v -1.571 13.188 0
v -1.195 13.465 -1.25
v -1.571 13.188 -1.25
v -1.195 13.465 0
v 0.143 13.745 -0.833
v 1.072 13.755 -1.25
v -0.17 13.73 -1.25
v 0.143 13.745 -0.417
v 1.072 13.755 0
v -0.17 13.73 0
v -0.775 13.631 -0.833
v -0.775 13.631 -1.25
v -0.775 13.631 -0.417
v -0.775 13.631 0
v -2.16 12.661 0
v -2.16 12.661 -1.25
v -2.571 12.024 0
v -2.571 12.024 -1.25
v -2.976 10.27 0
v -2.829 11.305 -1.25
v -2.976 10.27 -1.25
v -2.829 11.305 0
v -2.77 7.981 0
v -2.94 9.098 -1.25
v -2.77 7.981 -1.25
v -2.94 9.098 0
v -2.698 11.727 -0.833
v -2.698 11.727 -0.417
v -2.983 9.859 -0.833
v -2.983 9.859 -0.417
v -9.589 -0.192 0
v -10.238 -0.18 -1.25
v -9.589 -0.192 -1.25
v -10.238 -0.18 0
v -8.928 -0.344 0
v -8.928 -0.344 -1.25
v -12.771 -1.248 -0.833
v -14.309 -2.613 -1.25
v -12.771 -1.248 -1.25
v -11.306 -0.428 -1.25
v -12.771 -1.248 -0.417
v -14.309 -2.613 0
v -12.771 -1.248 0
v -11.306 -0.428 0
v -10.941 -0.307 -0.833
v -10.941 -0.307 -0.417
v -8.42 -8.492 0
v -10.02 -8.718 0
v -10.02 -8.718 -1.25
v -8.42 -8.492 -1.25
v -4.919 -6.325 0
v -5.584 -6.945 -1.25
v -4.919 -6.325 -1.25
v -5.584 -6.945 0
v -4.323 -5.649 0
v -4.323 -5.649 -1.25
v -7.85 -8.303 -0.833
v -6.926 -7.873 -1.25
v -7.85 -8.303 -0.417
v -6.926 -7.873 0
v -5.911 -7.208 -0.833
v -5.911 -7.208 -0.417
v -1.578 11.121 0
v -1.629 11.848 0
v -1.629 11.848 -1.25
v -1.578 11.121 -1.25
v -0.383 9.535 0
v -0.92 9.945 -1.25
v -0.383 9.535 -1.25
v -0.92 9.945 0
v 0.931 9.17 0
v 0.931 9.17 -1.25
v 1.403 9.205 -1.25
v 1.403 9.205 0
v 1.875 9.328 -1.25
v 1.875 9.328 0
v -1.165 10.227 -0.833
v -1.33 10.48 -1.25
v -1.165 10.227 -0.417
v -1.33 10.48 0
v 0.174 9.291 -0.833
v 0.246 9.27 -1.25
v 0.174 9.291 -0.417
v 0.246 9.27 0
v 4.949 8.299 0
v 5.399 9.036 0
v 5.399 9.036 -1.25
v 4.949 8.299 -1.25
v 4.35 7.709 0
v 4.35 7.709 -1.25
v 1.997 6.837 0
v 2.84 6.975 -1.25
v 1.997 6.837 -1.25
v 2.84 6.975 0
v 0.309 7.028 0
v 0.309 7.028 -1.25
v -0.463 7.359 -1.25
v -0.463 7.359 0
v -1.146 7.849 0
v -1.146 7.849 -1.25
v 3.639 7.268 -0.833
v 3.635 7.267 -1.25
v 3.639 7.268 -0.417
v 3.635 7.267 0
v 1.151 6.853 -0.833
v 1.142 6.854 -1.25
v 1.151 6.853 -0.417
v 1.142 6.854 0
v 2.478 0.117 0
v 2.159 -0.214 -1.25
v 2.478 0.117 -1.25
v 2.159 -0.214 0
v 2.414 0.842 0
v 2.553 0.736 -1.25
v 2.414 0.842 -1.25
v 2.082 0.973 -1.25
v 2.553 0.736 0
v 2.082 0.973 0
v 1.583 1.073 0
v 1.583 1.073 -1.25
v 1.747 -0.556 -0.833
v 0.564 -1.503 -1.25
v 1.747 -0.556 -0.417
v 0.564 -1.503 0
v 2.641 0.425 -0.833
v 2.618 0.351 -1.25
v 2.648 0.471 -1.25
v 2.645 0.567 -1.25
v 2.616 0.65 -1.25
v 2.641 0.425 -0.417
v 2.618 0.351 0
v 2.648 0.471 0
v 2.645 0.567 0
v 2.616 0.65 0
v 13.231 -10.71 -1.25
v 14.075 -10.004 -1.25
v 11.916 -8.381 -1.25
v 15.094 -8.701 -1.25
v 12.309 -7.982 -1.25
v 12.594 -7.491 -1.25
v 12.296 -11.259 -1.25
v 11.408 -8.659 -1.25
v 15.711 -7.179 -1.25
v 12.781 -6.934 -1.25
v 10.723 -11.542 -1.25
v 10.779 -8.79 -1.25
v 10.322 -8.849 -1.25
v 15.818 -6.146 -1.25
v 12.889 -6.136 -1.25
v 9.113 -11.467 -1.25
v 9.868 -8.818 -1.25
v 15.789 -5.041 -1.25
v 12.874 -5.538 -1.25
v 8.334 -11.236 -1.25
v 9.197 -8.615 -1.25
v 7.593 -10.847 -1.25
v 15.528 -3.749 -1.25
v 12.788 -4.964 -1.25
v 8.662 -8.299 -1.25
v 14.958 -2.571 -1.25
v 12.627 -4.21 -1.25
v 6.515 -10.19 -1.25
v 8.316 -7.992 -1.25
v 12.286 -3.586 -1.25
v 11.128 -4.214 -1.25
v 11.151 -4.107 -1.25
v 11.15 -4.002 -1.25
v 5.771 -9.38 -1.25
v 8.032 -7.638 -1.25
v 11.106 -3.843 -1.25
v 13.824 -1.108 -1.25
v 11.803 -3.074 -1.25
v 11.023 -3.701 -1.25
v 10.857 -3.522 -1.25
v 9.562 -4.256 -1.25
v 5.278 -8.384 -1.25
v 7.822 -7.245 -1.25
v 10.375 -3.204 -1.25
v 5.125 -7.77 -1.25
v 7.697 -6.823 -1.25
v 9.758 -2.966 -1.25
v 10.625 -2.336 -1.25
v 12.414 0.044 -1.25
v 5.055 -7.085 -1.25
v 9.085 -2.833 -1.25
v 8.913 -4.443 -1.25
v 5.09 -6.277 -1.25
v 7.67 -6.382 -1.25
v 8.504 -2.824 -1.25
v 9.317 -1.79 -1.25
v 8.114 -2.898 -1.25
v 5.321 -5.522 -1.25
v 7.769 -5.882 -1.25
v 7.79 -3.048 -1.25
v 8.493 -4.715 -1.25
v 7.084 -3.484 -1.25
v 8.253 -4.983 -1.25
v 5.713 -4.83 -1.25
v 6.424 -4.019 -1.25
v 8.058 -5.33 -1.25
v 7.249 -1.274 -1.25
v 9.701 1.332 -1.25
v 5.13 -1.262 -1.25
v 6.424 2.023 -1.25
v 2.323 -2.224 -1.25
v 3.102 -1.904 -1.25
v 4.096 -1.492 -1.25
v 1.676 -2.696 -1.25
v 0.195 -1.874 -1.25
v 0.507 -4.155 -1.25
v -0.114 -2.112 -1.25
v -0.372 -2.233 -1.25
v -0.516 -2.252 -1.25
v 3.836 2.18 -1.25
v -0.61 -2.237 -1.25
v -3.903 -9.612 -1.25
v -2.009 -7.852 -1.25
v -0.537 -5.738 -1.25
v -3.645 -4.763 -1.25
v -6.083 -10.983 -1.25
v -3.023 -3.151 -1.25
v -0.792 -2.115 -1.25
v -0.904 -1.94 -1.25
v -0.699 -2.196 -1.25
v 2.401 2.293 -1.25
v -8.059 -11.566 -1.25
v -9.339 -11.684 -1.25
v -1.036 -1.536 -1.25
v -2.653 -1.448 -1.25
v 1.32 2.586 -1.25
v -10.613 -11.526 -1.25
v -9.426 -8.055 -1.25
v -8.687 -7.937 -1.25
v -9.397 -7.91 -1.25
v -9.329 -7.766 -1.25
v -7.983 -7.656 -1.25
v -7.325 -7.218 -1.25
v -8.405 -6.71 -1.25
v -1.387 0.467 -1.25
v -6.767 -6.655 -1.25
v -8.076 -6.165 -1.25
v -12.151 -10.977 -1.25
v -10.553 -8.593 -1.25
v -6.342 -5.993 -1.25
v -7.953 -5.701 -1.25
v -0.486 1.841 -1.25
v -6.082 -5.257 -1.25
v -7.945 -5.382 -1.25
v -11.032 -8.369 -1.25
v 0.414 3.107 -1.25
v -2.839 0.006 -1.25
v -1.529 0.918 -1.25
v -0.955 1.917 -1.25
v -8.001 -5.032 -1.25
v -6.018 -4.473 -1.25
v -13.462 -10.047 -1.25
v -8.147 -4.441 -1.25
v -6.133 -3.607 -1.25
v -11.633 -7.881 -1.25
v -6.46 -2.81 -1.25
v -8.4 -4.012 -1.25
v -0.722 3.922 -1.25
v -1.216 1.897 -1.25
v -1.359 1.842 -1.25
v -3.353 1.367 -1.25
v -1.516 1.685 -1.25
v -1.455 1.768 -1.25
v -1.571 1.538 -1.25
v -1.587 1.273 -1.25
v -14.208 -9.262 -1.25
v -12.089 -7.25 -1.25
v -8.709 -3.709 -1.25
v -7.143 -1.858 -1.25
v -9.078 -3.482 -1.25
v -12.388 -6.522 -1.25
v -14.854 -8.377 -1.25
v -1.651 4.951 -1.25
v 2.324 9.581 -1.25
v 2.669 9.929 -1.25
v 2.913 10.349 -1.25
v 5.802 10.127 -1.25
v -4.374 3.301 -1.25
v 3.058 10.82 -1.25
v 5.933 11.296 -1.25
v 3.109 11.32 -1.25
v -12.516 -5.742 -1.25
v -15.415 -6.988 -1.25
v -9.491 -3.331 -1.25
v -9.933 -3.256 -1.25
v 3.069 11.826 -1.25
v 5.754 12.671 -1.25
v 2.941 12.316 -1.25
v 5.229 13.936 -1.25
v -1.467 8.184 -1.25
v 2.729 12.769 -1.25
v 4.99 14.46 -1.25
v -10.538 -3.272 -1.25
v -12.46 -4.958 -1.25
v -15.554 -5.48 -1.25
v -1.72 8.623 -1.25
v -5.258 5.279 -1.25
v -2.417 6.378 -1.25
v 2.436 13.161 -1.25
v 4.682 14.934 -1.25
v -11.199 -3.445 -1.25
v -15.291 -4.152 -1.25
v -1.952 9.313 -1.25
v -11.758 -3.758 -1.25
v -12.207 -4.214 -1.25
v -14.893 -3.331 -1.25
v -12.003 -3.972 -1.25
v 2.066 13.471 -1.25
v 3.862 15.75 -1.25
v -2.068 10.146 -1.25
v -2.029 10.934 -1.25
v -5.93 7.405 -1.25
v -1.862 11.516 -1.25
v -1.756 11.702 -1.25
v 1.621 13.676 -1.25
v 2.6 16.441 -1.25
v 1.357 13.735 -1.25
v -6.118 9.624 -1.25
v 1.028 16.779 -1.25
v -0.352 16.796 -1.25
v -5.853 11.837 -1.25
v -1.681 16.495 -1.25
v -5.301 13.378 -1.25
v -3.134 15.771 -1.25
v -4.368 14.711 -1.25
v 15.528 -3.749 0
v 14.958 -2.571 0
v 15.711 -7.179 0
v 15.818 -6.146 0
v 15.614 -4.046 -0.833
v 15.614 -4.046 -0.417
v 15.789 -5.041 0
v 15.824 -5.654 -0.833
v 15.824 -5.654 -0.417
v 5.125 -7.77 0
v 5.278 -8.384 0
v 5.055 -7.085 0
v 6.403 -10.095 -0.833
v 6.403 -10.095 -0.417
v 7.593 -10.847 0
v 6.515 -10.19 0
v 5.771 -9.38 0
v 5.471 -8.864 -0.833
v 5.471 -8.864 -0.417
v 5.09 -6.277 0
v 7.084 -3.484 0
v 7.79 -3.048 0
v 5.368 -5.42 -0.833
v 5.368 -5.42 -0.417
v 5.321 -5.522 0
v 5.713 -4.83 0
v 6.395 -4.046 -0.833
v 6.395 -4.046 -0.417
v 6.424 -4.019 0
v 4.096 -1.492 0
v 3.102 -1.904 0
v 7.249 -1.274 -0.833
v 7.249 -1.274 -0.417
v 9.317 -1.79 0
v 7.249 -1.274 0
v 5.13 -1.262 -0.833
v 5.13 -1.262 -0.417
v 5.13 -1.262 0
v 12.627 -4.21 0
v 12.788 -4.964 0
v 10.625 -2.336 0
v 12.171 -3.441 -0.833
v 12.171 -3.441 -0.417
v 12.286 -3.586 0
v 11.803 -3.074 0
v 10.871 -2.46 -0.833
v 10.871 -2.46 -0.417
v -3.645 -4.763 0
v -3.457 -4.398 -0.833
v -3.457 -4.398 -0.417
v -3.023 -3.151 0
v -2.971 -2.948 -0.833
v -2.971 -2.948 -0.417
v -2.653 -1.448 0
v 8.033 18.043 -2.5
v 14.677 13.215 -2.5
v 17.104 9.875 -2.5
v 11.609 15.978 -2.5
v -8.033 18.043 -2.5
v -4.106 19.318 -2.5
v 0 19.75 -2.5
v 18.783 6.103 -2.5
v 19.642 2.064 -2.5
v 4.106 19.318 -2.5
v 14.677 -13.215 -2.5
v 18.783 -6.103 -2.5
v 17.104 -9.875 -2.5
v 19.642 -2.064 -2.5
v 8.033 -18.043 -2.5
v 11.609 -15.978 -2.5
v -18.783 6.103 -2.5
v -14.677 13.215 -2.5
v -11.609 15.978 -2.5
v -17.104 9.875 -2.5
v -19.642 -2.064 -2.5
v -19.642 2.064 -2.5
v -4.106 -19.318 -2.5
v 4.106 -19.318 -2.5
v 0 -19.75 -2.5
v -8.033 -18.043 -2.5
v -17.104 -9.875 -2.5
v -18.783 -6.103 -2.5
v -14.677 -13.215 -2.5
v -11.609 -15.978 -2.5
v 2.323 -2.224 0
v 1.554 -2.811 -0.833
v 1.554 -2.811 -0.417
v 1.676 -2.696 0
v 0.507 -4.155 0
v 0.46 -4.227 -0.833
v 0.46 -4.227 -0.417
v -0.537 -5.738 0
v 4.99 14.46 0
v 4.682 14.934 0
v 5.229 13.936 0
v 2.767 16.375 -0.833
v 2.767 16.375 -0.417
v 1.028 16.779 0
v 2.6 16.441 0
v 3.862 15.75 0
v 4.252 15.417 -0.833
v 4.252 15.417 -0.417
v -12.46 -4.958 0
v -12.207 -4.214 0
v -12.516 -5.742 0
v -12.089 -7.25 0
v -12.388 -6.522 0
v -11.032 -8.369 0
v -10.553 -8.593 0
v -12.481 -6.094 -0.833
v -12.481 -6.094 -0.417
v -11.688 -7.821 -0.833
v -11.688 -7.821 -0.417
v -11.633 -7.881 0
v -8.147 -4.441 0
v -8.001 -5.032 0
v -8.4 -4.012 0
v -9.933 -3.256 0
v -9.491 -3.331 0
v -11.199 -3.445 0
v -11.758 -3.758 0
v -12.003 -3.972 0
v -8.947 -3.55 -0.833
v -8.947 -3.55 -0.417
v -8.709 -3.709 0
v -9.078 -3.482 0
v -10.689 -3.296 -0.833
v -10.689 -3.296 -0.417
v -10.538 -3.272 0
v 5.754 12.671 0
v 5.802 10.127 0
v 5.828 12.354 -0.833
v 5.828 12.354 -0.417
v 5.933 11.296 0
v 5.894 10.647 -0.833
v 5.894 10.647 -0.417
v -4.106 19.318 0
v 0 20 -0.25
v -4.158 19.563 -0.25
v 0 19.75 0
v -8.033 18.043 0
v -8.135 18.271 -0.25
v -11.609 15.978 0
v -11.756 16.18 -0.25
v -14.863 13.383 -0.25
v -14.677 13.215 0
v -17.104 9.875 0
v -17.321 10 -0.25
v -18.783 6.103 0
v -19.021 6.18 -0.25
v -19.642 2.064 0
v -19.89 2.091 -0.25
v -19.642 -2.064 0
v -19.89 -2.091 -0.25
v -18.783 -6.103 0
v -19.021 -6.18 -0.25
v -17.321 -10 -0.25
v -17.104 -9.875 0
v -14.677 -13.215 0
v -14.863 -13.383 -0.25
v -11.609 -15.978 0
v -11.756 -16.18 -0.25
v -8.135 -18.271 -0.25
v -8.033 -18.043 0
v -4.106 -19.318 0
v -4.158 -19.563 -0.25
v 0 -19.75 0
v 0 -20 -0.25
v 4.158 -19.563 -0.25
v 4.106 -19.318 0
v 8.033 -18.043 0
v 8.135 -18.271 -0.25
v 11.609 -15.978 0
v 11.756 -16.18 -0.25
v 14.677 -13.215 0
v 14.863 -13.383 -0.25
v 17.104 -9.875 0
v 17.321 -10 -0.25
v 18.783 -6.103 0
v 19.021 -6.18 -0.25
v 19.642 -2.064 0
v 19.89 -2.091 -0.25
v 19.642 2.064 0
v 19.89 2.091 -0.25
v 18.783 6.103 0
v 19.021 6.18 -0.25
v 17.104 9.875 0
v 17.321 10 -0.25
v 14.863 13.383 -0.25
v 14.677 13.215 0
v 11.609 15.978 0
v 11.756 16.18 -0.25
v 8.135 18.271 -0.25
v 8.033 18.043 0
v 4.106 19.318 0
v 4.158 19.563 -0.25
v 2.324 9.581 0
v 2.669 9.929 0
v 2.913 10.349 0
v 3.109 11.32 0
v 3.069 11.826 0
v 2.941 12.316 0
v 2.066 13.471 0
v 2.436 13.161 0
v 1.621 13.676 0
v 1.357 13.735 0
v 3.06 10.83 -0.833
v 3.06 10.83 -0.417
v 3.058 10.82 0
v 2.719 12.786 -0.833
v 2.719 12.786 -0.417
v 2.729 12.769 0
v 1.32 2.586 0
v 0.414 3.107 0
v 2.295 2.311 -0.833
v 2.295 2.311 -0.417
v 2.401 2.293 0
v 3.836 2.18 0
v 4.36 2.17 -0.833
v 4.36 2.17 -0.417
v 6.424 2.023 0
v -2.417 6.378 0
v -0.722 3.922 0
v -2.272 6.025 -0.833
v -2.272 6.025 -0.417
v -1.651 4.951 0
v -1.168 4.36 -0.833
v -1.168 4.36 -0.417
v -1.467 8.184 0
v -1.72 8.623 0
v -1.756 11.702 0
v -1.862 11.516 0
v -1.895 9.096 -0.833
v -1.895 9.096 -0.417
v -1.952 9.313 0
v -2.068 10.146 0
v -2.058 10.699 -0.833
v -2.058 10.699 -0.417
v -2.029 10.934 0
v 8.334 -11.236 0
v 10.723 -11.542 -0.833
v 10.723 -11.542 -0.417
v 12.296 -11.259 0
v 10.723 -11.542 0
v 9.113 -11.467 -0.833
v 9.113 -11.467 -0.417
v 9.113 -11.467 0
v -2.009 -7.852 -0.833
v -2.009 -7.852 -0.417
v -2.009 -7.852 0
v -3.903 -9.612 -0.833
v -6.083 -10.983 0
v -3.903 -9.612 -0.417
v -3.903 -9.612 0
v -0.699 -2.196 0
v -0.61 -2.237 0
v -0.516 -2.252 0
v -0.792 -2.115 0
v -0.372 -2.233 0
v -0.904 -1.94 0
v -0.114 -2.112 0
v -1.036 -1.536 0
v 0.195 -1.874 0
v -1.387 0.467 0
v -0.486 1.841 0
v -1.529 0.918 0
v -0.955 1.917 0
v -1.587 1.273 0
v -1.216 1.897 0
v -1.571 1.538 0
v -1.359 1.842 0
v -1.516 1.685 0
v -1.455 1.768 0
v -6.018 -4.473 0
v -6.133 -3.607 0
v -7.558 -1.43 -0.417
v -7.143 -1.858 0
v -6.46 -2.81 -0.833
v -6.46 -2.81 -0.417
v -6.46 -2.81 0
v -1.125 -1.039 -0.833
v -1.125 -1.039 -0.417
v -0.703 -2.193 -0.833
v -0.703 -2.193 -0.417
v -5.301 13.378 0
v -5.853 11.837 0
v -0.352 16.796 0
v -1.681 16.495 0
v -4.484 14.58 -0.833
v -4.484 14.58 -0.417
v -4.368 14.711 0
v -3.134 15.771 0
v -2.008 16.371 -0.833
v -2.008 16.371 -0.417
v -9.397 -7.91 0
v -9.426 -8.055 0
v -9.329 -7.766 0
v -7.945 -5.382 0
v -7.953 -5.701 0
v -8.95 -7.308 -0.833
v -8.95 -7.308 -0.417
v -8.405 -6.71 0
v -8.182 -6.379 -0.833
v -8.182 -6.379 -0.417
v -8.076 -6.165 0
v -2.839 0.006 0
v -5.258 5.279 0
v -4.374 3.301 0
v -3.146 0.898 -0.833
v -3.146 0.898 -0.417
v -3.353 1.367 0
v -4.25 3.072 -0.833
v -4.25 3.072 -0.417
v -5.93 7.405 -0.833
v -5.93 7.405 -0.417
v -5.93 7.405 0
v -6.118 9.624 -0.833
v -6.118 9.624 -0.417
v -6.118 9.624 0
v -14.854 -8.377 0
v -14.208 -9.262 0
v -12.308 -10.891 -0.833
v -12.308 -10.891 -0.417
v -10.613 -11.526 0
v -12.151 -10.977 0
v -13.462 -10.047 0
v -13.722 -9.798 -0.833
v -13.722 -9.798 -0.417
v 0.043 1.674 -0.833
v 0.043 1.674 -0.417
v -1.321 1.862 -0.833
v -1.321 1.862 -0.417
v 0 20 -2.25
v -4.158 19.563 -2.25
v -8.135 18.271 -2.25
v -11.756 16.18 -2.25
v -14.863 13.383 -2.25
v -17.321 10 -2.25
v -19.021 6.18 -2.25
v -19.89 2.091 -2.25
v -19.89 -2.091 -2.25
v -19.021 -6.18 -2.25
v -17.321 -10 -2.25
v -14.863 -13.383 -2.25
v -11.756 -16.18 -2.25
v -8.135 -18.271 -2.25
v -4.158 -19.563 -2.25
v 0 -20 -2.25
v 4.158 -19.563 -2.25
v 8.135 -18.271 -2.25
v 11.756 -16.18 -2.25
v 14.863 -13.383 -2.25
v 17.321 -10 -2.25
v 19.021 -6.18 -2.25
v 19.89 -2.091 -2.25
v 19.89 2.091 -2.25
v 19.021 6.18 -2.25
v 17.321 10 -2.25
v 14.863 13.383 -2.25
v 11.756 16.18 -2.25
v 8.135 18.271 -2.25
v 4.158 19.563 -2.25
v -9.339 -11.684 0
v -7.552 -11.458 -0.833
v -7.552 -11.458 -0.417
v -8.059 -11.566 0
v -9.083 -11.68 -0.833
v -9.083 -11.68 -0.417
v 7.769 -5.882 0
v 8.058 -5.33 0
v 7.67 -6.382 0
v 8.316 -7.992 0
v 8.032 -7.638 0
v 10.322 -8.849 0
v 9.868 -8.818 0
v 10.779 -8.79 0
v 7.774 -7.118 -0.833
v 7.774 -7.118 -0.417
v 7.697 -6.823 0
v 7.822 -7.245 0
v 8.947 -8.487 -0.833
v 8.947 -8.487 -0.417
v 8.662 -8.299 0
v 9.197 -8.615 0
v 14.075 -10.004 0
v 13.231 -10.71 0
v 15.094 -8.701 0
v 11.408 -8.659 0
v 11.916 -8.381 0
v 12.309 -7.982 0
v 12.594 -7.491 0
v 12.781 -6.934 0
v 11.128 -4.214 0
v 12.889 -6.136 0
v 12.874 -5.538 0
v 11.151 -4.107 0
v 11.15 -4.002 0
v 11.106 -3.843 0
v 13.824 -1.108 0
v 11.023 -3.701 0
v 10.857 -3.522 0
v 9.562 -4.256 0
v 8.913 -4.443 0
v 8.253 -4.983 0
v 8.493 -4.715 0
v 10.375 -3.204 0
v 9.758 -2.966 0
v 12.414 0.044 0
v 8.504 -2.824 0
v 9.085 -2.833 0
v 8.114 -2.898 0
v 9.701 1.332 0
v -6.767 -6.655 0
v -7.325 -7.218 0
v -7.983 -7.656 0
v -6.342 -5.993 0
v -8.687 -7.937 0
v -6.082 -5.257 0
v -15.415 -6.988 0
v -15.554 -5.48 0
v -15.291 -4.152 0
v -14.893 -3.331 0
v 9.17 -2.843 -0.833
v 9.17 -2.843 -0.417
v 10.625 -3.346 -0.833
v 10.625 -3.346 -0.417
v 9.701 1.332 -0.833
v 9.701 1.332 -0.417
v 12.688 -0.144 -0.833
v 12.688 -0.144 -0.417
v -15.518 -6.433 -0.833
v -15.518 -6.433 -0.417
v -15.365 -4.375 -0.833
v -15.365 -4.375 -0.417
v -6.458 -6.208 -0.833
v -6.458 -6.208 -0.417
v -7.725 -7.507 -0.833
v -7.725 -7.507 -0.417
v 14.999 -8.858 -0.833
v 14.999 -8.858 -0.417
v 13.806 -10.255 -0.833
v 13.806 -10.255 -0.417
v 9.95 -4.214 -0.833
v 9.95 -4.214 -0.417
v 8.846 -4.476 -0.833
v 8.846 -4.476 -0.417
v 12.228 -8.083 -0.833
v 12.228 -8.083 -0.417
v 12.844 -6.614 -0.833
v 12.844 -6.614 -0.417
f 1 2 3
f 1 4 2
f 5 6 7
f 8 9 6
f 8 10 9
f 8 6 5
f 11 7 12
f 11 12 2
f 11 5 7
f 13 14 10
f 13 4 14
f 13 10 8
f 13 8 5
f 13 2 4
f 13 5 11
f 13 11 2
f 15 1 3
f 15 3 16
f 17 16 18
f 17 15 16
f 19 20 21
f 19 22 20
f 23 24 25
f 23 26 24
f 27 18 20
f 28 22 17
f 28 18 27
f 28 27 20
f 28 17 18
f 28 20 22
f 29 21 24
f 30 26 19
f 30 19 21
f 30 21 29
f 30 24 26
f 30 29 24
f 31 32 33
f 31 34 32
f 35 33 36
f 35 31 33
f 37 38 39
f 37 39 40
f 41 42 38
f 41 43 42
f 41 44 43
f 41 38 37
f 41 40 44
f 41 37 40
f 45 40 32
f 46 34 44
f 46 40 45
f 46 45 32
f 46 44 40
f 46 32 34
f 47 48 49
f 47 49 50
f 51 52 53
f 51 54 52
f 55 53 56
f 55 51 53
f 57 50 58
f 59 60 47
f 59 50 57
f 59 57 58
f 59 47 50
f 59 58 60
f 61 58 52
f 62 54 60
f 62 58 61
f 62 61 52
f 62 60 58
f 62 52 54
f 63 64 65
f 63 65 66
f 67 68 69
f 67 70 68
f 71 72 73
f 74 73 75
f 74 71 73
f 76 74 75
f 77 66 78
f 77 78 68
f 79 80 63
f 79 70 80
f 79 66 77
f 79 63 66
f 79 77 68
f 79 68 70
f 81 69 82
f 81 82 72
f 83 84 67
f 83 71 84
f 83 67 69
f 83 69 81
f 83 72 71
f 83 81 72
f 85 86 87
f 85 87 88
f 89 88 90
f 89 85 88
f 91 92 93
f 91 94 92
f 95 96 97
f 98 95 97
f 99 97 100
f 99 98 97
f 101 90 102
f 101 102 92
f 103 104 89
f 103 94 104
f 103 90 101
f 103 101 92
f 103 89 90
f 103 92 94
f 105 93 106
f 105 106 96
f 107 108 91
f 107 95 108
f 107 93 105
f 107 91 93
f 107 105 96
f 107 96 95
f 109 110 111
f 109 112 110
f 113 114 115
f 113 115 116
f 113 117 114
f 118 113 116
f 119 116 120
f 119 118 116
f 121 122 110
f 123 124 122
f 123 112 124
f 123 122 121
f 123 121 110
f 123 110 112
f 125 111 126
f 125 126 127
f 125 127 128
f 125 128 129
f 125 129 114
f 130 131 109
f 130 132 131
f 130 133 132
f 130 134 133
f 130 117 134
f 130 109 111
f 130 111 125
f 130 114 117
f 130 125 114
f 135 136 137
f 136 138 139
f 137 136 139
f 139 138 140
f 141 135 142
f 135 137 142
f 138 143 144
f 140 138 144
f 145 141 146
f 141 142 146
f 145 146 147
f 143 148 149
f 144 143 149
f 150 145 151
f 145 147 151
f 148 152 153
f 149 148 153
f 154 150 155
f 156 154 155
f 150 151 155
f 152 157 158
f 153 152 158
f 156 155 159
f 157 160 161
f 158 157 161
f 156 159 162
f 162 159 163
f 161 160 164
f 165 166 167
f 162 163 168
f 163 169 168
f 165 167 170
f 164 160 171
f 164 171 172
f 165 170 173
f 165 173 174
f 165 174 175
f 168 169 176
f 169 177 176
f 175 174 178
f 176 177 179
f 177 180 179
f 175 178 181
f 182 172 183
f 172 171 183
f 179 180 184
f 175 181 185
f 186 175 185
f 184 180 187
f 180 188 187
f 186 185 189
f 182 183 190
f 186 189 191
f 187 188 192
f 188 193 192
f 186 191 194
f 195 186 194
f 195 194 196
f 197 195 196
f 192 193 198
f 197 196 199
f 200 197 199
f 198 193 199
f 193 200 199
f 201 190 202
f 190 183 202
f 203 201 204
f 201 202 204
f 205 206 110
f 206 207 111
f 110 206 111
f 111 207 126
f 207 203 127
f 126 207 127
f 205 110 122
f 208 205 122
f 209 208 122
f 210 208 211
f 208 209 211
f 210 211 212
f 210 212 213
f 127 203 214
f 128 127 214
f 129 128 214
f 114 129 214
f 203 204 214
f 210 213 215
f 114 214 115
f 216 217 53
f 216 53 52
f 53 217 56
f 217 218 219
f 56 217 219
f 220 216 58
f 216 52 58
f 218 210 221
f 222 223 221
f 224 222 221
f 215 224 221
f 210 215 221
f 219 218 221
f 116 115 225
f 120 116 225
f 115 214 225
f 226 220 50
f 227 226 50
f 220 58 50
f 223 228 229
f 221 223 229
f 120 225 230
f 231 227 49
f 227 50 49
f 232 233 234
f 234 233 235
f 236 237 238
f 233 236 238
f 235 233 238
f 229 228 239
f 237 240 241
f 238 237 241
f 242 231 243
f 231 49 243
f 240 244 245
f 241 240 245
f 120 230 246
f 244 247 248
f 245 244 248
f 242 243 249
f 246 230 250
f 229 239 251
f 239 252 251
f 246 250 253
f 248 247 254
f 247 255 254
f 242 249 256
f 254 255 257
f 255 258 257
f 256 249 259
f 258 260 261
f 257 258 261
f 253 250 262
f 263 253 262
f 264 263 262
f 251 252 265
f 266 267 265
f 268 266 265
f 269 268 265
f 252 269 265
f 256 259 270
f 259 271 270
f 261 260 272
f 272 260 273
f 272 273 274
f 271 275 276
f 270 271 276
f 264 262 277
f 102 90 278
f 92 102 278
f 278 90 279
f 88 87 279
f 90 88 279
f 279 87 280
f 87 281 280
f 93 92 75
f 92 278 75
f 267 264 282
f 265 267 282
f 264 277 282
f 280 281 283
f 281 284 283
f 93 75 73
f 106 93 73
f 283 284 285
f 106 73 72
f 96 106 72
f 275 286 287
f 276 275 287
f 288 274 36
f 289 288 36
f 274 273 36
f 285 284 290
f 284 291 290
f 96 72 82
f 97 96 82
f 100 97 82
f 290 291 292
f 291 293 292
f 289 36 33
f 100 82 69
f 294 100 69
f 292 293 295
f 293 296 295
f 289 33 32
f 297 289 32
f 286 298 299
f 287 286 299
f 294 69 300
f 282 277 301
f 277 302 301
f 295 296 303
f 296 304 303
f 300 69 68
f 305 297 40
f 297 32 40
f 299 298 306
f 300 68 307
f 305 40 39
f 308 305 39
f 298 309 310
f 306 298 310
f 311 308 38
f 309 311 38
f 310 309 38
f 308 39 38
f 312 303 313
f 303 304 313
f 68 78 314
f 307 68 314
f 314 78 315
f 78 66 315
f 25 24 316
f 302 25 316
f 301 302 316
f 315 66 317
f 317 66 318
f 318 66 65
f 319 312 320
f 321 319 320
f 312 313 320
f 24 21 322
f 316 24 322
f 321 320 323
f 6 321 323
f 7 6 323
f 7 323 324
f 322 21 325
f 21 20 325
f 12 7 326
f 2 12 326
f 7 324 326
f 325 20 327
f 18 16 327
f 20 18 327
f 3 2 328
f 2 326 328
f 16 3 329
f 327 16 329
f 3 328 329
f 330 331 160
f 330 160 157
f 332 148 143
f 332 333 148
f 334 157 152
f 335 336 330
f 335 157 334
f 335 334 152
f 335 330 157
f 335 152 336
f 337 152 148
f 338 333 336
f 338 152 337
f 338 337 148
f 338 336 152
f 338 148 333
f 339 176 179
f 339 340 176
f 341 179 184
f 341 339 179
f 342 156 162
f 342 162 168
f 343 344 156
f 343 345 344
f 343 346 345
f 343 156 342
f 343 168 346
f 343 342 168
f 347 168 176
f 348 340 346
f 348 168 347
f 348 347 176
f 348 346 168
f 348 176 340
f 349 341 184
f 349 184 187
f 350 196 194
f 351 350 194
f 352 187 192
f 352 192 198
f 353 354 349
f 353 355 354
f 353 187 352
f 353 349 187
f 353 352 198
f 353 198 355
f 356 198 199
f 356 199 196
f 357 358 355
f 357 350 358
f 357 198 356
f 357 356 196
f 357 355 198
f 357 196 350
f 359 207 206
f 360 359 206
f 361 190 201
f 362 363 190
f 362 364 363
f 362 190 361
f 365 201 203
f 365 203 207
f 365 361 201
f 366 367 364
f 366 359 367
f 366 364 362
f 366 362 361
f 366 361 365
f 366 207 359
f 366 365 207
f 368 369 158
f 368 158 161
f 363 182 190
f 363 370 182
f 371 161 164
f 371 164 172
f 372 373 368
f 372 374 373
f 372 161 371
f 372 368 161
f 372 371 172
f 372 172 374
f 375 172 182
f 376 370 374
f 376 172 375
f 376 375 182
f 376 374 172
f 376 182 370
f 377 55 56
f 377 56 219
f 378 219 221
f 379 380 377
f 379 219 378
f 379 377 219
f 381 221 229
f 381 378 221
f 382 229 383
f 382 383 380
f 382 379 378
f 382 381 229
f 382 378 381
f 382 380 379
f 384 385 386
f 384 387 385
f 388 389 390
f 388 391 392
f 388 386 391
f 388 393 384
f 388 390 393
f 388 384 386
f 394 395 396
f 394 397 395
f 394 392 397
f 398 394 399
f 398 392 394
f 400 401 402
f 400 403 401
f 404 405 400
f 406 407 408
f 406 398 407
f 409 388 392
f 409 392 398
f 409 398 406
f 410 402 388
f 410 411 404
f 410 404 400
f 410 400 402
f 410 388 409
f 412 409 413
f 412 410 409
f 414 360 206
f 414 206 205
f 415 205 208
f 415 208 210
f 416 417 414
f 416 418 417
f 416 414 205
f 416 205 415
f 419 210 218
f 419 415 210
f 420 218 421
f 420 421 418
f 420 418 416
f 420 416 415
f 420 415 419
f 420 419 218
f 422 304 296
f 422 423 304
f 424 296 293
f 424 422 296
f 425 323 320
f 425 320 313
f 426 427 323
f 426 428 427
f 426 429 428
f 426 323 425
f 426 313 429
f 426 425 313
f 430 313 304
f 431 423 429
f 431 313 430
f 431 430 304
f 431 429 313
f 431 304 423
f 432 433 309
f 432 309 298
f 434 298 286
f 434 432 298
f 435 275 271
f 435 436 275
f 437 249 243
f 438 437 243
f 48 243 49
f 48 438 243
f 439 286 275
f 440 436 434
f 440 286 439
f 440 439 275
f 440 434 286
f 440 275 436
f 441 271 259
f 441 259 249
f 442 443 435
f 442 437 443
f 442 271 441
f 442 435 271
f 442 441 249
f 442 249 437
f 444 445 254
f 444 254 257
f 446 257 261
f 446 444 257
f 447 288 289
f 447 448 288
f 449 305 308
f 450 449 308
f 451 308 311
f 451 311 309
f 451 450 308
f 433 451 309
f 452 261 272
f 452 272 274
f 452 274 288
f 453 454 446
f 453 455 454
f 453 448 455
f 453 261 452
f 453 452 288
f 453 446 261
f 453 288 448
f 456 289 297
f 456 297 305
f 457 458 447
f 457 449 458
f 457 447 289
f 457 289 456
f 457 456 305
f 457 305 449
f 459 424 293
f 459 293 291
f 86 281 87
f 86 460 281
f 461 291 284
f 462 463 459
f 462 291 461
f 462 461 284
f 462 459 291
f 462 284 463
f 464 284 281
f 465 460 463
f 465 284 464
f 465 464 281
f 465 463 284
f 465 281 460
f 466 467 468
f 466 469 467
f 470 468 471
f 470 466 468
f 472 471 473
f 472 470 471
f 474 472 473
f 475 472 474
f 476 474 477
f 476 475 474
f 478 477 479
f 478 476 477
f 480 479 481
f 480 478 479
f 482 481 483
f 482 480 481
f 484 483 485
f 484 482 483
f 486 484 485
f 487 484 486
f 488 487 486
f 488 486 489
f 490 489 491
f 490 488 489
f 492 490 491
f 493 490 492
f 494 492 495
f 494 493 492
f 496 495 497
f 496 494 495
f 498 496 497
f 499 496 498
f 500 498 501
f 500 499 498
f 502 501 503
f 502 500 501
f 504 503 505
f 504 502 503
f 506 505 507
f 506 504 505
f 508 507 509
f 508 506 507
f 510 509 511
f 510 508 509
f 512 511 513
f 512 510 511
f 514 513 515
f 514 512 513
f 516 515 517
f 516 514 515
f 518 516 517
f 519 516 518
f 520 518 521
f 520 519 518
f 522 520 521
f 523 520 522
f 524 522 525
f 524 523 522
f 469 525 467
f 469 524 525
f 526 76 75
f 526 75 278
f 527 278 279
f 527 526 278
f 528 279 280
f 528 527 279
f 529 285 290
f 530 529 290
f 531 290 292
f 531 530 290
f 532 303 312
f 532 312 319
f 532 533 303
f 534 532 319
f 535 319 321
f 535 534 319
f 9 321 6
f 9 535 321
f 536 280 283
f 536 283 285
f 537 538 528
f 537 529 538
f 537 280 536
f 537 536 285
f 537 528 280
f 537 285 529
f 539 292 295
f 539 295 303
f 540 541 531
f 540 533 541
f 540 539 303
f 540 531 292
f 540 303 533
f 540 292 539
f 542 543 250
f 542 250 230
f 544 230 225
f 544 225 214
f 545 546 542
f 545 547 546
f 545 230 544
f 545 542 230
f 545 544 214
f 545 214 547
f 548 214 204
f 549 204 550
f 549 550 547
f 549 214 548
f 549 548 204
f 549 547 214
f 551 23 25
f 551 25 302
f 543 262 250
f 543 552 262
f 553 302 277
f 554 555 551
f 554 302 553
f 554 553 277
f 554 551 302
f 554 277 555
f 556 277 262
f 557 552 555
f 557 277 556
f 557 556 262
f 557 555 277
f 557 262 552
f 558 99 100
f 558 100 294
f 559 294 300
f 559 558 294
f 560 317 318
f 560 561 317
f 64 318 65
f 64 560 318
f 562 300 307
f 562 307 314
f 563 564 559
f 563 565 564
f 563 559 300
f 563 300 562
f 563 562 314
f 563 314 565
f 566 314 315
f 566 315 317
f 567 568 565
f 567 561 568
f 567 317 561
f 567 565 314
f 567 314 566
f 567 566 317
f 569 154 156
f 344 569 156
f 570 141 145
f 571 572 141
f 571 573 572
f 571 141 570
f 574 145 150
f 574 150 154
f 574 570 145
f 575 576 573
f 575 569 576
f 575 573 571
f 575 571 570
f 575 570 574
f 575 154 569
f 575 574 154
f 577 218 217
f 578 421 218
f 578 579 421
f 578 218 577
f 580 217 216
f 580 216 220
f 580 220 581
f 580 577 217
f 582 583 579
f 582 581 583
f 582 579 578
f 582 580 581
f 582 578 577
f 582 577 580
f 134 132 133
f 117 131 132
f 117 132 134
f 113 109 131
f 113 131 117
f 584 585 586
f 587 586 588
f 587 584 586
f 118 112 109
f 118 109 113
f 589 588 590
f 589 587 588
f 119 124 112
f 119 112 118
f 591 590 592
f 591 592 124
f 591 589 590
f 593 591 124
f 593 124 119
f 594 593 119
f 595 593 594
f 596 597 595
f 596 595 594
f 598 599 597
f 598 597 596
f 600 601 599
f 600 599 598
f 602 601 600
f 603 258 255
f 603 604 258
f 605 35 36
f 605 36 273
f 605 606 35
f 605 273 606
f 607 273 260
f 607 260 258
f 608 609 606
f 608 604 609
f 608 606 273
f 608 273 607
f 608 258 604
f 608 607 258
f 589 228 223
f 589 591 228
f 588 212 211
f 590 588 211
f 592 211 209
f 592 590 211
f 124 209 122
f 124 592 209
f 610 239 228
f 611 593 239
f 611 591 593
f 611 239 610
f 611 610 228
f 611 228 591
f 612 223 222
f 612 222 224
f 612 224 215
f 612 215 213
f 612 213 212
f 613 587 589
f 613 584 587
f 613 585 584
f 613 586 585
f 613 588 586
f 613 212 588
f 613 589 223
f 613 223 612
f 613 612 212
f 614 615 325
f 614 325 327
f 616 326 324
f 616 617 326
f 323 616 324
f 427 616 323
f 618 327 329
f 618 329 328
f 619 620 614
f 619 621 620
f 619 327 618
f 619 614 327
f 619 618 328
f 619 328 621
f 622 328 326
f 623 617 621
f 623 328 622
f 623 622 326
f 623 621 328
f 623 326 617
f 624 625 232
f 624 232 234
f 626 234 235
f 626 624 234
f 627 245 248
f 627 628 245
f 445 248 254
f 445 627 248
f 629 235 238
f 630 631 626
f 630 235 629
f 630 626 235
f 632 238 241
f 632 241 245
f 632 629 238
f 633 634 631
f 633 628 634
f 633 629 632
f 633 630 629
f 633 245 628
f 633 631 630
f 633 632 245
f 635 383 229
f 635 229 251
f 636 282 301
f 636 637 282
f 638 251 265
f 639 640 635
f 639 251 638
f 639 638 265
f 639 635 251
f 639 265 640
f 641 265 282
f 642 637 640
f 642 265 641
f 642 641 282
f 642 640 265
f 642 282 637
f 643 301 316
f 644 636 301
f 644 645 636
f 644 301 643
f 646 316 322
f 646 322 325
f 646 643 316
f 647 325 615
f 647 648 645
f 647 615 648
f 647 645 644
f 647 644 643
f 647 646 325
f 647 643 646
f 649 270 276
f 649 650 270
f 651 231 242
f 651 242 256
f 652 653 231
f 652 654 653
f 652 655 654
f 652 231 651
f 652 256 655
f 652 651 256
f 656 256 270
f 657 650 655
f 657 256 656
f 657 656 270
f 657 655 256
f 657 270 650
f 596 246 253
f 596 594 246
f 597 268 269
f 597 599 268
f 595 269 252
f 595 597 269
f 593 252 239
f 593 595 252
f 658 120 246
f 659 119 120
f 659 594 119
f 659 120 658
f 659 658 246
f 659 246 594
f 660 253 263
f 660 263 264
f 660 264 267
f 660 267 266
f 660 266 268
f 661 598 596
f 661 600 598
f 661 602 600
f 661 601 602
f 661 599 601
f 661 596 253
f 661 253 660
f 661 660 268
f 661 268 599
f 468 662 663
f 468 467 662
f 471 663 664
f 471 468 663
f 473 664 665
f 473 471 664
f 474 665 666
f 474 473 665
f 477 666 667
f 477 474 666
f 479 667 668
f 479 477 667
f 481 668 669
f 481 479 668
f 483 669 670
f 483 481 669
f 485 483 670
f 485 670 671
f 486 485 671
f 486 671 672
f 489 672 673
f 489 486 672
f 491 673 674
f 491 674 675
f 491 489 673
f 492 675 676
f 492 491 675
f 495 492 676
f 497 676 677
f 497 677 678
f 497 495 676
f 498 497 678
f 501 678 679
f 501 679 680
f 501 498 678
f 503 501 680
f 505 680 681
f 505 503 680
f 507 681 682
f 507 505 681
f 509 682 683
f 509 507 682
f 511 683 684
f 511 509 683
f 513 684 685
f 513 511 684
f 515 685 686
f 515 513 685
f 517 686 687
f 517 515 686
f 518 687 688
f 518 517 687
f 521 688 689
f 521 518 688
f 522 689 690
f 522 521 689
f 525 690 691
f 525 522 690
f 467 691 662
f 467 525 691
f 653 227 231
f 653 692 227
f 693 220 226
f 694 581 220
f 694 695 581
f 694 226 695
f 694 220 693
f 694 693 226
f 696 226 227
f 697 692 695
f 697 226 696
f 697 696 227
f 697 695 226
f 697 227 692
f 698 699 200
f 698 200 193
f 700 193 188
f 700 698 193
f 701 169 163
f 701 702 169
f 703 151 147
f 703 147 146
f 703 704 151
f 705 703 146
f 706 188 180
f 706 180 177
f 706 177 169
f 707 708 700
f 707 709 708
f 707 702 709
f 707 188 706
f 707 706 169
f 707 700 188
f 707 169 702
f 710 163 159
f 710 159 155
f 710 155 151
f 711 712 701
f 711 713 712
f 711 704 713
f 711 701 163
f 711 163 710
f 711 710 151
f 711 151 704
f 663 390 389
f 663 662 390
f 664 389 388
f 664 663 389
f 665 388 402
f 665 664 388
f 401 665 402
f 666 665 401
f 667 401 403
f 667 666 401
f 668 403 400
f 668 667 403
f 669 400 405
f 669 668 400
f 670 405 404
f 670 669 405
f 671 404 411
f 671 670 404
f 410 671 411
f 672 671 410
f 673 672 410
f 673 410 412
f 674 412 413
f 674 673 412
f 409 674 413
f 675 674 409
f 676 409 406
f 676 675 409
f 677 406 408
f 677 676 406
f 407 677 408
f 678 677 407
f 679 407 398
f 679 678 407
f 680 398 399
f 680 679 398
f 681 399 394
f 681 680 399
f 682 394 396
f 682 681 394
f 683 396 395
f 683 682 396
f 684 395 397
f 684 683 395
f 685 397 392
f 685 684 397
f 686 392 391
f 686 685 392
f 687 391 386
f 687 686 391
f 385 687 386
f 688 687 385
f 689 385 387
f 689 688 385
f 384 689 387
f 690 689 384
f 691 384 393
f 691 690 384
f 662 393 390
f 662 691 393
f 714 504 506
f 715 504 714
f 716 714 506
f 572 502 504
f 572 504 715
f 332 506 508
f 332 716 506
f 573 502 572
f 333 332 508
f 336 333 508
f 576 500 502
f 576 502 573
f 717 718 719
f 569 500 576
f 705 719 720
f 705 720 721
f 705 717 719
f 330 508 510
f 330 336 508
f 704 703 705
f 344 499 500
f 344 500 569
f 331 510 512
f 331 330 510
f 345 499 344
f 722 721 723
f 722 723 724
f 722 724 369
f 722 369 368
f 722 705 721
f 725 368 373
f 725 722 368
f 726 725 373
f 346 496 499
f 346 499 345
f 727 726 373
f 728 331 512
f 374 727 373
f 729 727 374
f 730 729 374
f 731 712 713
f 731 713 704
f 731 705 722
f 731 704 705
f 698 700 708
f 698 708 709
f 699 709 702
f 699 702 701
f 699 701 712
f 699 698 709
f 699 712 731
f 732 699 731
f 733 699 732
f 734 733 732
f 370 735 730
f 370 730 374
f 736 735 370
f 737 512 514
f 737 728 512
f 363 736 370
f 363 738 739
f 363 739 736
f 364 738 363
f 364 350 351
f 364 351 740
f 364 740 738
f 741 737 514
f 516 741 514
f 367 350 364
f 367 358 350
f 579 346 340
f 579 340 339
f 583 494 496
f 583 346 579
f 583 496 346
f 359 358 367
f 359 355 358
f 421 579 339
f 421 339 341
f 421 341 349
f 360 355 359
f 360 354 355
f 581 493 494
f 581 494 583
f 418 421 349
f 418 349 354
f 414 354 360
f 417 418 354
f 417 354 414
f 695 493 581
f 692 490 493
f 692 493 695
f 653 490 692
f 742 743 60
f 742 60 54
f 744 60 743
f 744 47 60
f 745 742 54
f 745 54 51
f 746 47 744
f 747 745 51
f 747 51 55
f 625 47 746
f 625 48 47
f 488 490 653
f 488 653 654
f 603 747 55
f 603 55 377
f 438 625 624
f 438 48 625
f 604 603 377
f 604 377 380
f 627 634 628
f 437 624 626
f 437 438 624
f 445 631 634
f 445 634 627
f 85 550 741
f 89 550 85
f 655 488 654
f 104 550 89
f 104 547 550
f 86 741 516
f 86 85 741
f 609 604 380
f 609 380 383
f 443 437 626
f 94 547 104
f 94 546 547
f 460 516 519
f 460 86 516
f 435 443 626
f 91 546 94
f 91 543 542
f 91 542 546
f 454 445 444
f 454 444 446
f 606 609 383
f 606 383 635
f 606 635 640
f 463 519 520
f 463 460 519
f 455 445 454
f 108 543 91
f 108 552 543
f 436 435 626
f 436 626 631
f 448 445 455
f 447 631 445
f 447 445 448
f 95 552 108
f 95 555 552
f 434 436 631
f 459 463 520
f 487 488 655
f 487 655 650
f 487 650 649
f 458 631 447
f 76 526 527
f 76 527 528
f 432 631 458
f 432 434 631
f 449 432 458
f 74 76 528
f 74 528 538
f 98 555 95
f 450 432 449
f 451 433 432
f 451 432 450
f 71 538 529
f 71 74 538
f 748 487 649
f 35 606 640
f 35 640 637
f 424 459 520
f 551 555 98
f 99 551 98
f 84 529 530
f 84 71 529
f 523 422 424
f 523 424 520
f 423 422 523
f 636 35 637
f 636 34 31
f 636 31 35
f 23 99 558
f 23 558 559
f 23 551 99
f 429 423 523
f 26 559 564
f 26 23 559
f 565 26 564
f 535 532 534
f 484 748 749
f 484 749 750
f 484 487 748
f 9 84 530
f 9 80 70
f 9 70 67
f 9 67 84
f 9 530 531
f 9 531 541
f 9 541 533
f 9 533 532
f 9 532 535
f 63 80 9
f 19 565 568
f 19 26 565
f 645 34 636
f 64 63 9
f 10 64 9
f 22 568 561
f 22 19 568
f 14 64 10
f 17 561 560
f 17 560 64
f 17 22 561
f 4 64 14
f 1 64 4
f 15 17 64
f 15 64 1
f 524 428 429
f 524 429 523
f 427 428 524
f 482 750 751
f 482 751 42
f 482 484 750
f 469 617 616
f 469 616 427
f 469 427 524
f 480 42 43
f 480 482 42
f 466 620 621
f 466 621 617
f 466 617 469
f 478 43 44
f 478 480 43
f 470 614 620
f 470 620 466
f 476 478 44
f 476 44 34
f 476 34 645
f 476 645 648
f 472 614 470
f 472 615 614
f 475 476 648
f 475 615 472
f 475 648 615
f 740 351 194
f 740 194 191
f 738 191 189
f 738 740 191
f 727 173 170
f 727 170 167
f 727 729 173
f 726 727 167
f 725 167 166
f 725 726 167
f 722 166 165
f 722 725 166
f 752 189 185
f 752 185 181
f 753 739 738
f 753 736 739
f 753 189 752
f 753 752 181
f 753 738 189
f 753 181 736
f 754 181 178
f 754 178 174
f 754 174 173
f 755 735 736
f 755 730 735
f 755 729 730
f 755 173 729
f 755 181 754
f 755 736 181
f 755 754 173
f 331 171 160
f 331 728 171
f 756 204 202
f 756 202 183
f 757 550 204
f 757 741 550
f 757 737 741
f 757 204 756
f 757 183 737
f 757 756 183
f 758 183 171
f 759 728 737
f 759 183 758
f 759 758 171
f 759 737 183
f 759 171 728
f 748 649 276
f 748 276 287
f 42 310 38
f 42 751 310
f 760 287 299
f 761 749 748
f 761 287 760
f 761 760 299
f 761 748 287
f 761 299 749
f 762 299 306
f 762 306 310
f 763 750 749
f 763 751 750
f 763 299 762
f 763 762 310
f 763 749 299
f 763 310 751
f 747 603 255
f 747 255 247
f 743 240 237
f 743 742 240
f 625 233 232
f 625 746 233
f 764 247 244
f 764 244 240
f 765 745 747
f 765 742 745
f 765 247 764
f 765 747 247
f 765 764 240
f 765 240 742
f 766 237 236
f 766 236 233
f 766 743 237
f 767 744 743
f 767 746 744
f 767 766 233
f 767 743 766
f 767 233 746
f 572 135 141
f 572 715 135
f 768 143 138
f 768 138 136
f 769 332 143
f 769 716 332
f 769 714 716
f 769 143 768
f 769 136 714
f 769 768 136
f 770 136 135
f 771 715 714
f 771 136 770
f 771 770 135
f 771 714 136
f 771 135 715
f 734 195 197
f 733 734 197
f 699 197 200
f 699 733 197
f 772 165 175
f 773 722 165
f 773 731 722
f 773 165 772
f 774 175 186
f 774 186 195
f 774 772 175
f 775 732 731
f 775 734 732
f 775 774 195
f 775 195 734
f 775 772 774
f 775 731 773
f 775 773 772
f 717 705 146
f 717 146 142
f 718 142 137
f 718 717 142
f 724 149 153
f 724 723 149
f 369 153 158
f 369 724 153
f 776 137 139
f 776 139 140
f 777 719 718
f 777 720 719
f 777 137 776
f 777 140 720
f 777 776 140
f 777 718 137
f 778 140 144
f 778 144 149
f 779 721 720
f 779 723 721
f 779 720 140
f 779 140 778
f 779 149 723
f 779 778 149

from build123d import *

# Parameters (mm, degrees)
POCKET_DEPTH = 1.25


with BuildPart() as part:
    # Sketch (on DatumPlane) → Revolution (revolve)
    with BuildSketch(Plane.YZ):
        Polygon((0, 0), (0, -2.5), (19.75, -2.5), (20, -2.25), (20, -0.25), (19.75, 0), align=None)
    revolve(axis=Axis((0, 0, 0), (0, 0, 1)))

    # Sketch005 → Pocket (cut)
    with BuildSketch(Plane.XY):
        with BuildLine():
            add(Edge.make_bspline(
                [(-10.613193, -11.526321), (-12.449243, -11.162413), (-13.862224, -9.91866), (-14.8542, -8.377039)],
                knots=[0, 0, 0, 0, 1, 1, 1, 1], degree=3))
            add(Edge.make_bspline(
                [(-14.8542, -8.377039), (-15.897082, -6.624915), (-15.8448, -4.092006), (-14.308682, -2.612985)],
                knots=[0, 0, 0, 0, 1, 1, 1, 1], degree=3))
            add(Edge.make_bspline(
                [(-14.308682, -2.612985), (-12.954862, -1.221329), (-10.995675, 0.366382), (-8.928485, -0.344235)],
                knots=[0, 0, 0, 0, 1, 1, 1, 1], degree=3))
            add(Edge.make_bspline(
                [(-8.928485, -0.344235), (-7.548524, -1.279114), (-6.005527, -2.671458), (-6.01791, -4.473111)],
                knots=[0, 0, 0, 0, 1, 1, 1, 1], degree=3))
            add(Edge.make_bspline(
                [(-6.01791, -4.473111), (-5.914034, -6.321544), (-7.637953, -7.986302), (-9.425849, -8.055094)],
                knots=[0, 0, 0, 0, 1, 1, 1, 1], degree=3))
            add(Edge.make_bspline(
                [(-9.425849, -8.055094), (-9.389389, -7.319711), (-7.594615, -6.666878), (-8.001174, -5.032388)],
                knots=[0, 0, 0, 0, 1, 1, 1, 1], degree=3))
            add(Edge.make_bspline(
                [(-8.001174, -5.032388), (-8.209612, -2.917044), (-11.141513, -2.729243), (-12.207096, -4.213767)],
                knots=[0, 0, 0, 0, 1, 1, 1, 1], degree=3))
            add(Edge.make_bspline(
                [(-12.207096, -4.213767), (-13.077311, -5.946629), (-12.062634, -8.460277), (-10.019521, -8.718245)],
                knots=[0, 0, 0, 0, 1, 1, 1, 1], degree=3))
            add(Edge.make_bspline(
                [(-10.019521, -8.718245), (-7.773473, -8.716182), (-5.696653, -7.366489), (-4.322883, -5.649449)],
                knots=[0, 0, 0, 0, 1, 1, 1, 1], degree=3))
            add(Edge.make_bspline(
                [(-4.322883, -5.649449), (-3.1947, -4.547406), (-2.959432, -2.923923), (-2.652621, -1.448342)],
                knots=[0, 0, 0, 0, 1, 1, 1, 1], degree=3))
            add(Edge.make_bspline(
                [(-2.652621, -1.448342), (-2.604467, 1.053611), (-4.534073, 2.986657), (-5.257762, 5.279483)],
                knots=[0, 0, 0, 0, 1, 1, 1, 1], degree=3))
            add(Edge.make_bspline(
                [(-5.257762, 5.279483), (-6.18301, 7.323972), (-6.332976, 9.661513), (-5.85281, 11.836705)],
                knots=[0, 0, 0, 0, 1, 1, 1, 1], degree=3))
            add(Edge.make_bspline(
                [(-5.85281, 11.836705), (-5.219238, 14.911693), (-2.105039, 17.205895), (1.027733, 16.779387)],
                knots=[0, 0, 0, 0, 1, 1, 1, 1], degree=3))
            add(Edge.make_bspline(
                [(1.027733, 16.779387), (2.809437, 16.661065), (4.590454, 15.669777), (5.22884, 13.935539)],
                knots=[0, 0, 0, 0, 1, 1, 1, 1], degree=3))
            add(Edge.make_bspline(
                [(5.22884, 13.935539), (6.083921, 12.490226), (6.185045, 10.524848), (5.398756, 9.035509)],
                knots=[0, 0, 0, 0, 1, 1, 1, 1], degree=3))
            add(Edge.make_bspline(
                [(5.398756, 9.035509), (4.309096, 6.612666), (0.749127, 6.126997), (-1.146084, 7.848852)],
                knots=[0, 0, 0, 0, 1, 1, 1, 1], degree=3))
            add(Edge.make_bspline(
                [(-1.146084, 7.848852), (-2.186902, 8.648899), (-2.355441, 11.196255), (-1.629001, 11.847712)],
                knots=[0, 0, 0, 0, 1, 1, 1, 1], degree=3))
            add(Edge.make_bspline(
                [(-1.629001, 11.847712), (-1.774152, 9.981394), (0.165086, 8.70806), (1.874559, 9.327873)],
                knots=[0, 0, 0, 0, 1, 1, 1, 1], degree=3))
            add(Edge.make_bspline(
                [(1.874559, 9.327873), (3.897722, 10.123793), (3.29717, 13.759432), (1.072448, 13.755305)],
                knots=[0, 0, 0, 0, 1, 1, 1, 1], degree=3))
            add(Edge.make_bspline(
                [(1.072448, 13.755305), (0.173341, 13.722285), (-0.871605, 13.870187), (-1.571216, 13.188462)],
                knots=[0, 0, 0, 0, 1, 1, 1, 1], degree=3))
            add(Edge.make_bspline(
                [(-1.571216, 13.188462), (-3.233223, 12.063718), (-3.118341, 9.730992), (-2.769567, 7.980932)],
                knots=[0, 0, 0, 0, 1, 1, 1, 1], degree=3))
            add(Edge.make_bspline(
                [(-2.769567, 7.980932), (-2.618913, 5.918558), (-1.363465, 4.114841), (0.414111, 3.107043)],
                knots=[0, 0, 0, 0, 1, 1, 1, 1], degree=3))
            add(Edge.make_bspline(
                [(0.414111, 3.107043), (2.142158, 1.763541), (4.421226, 2.393673), (6.42444, 2.022886)],
                knots=[0, 0, 0, 0, 1, 1, 1, 1], degree=3))
            add(Edge.make_bspline(
                [(6.42444, 2.022886), (9.702363, 1.669297), (13.188725, 0.387708), (14.958046, -2.571022)],
                knots=[0, 0, 0, 0, 1, 1, 1, 1], degree=3))
            add(Edge.make_bspline(
                [(14.958046, -2.571022), (15.879167, -3.908332), (15.943143, -5.767771), (15.711315, -7.179376)],
                knots=[0, 0, 0, 0, 1, 1, 1, 1], degree=3))
            add(Edge.make_bspline(
                [(15.711315, -7.179376), (15.293062, -8.96108), (13.910349, -10.488943), (12.295809, -11.25941)],
                knots=[0, 0, 0, 0, 1, 1, 1, 1], degree=3))
            add(Edge.make_bspline(
                [(12.295809, -11.25941), (10.784456, -11.658401), (9.026141, -11.801488), (7.59321, -10.84666)],
                knots=[0, 0, 0, 0, 1, 1, 1, 1], degree=3))
            add(Edge.make_bspline(
                [(7.59321, -10.84666), (6.360463, -10.31146), (5.127029, -9.159888), (5.055485, -7.085131)],
                knots=[0, 0, 0, 0, 1, 1, 1, 1], degree=3))
            add(Edge.make_bspline(
                [(5.055485, -7.085131), (4.894513, -5.302051), (6.327443, -3.829909), (7.789954, -3.048436)],
                knots=[0, 0, 0, 0, 1, 1, 1, 1], degree=3))
            add(Edge.make_bspline(
                [(7.789954, -3.048436), (8.789497, -2.372214), (11.444168, -3.280264), (11.127726, -4.213767)],
                knots=[0, 0, 0, 0, 1, 1, 1, 1], degree=3))
            add(Edge.make_bspline(
                [(11.127726, -4.213767), (9.994039, -4.193129), (8.607887, -4.069304), (8.057554, -5.329568)],
                knots=[0, 0, 0, 0, 1, 1, 1, 1], degree=3))
            add(Edge.make_bspline(
                [(8.057554, -5.329568), (6.780093, -7.11196), (8.882366, -9.234871), (10.778952, -8.789789)],
                knots=[0, 0, 0, 0, 1, 1, 1, 1], degree=3))
            add(Edge.make_bspline(
                [(10.778952, -8.789789), (12.699616, -8.657709), (13.124748, -6.510721), (12.787669, -4.964284)],
                knots=[0, 0, 0, 0, 1, 1, 1, 1], degree=3))
            add(Edge.make_bspline(
                [(12.787669, -4.964284), (12.654213, -3.091775), (10.855999, -2.381845), (9.317129, -1.790236)],
                knots=[0, 0, 0, 0, 1, 1, 1, 1], degree=3))
            add(Edge.make_bspline(
                [(9.317129, -1.790236), (7.320795, -1.069988), (5.038288, -0.887002), (3.10249, -1.903743)],
                knots=[0, 0, 0, 0, 1, 1, 1, 1], degree=3))
            add(Edge.make_bspline(
                [(3.10249, -1.903743), (1.208655, -2.416928), (0.529681, -4.319018), (-0.537277, -5.737502)],
                knots=[0, 0, 0, 0, 1, 1, 1, 1], degree=3))
            add(Edge.make_bspline(
                [(-0.537277, -5.737502), (-1.750762, -8.018634), (-3.806945, -9.818224), (-6.083262, -10.982867)],
                knots=[0, 0, 0, 0, 1, 1, 1, 1], degree=3))
            add(Edge.make_bspline(
                [(-6.083262, -10.982867), (-7.501058, -11.543519), (-9.103216, -11.909491), (-10.613193, -11.526321)],
                knots=[0, 0, 0, 0, 1, 1, 1, 1], degree=3))
        make_face()
        with BuildLine():
            add(Edge.make_bspline(
                [(0.564077, -1.502687), (1.337296, -0.694385), (4.170825, 0.71378), (1.582882, 1.072873)],
                knots=[0, 0, 0, 0, 1, 1, 1, 1], degree=3))
            add(Edge.make_bspline(
                [(1.582882, 1.072873), (0.330186, 1.492502), (-2.344434, 3.04169), (-1.386854, 0.466818)],
                knots=[0, 0, 0, 0, 1, 1, 1, 1], degree=3))
            add(Edge.make_bspline(
                [(-1.386854, 0.466818), (-0.974792, -0.71571), (-1.355898, -3.613903), (0.564077, -1.502687)],
                knots=[0, 0, 0, 0, 1, 1, 1, 1], degree=3))
        make_face(mode=Mode.SUBTRACT)
    extrude(amount=-POCKET_DEPTH, mode=Mode.SUBTRACT)


solid = part.part
